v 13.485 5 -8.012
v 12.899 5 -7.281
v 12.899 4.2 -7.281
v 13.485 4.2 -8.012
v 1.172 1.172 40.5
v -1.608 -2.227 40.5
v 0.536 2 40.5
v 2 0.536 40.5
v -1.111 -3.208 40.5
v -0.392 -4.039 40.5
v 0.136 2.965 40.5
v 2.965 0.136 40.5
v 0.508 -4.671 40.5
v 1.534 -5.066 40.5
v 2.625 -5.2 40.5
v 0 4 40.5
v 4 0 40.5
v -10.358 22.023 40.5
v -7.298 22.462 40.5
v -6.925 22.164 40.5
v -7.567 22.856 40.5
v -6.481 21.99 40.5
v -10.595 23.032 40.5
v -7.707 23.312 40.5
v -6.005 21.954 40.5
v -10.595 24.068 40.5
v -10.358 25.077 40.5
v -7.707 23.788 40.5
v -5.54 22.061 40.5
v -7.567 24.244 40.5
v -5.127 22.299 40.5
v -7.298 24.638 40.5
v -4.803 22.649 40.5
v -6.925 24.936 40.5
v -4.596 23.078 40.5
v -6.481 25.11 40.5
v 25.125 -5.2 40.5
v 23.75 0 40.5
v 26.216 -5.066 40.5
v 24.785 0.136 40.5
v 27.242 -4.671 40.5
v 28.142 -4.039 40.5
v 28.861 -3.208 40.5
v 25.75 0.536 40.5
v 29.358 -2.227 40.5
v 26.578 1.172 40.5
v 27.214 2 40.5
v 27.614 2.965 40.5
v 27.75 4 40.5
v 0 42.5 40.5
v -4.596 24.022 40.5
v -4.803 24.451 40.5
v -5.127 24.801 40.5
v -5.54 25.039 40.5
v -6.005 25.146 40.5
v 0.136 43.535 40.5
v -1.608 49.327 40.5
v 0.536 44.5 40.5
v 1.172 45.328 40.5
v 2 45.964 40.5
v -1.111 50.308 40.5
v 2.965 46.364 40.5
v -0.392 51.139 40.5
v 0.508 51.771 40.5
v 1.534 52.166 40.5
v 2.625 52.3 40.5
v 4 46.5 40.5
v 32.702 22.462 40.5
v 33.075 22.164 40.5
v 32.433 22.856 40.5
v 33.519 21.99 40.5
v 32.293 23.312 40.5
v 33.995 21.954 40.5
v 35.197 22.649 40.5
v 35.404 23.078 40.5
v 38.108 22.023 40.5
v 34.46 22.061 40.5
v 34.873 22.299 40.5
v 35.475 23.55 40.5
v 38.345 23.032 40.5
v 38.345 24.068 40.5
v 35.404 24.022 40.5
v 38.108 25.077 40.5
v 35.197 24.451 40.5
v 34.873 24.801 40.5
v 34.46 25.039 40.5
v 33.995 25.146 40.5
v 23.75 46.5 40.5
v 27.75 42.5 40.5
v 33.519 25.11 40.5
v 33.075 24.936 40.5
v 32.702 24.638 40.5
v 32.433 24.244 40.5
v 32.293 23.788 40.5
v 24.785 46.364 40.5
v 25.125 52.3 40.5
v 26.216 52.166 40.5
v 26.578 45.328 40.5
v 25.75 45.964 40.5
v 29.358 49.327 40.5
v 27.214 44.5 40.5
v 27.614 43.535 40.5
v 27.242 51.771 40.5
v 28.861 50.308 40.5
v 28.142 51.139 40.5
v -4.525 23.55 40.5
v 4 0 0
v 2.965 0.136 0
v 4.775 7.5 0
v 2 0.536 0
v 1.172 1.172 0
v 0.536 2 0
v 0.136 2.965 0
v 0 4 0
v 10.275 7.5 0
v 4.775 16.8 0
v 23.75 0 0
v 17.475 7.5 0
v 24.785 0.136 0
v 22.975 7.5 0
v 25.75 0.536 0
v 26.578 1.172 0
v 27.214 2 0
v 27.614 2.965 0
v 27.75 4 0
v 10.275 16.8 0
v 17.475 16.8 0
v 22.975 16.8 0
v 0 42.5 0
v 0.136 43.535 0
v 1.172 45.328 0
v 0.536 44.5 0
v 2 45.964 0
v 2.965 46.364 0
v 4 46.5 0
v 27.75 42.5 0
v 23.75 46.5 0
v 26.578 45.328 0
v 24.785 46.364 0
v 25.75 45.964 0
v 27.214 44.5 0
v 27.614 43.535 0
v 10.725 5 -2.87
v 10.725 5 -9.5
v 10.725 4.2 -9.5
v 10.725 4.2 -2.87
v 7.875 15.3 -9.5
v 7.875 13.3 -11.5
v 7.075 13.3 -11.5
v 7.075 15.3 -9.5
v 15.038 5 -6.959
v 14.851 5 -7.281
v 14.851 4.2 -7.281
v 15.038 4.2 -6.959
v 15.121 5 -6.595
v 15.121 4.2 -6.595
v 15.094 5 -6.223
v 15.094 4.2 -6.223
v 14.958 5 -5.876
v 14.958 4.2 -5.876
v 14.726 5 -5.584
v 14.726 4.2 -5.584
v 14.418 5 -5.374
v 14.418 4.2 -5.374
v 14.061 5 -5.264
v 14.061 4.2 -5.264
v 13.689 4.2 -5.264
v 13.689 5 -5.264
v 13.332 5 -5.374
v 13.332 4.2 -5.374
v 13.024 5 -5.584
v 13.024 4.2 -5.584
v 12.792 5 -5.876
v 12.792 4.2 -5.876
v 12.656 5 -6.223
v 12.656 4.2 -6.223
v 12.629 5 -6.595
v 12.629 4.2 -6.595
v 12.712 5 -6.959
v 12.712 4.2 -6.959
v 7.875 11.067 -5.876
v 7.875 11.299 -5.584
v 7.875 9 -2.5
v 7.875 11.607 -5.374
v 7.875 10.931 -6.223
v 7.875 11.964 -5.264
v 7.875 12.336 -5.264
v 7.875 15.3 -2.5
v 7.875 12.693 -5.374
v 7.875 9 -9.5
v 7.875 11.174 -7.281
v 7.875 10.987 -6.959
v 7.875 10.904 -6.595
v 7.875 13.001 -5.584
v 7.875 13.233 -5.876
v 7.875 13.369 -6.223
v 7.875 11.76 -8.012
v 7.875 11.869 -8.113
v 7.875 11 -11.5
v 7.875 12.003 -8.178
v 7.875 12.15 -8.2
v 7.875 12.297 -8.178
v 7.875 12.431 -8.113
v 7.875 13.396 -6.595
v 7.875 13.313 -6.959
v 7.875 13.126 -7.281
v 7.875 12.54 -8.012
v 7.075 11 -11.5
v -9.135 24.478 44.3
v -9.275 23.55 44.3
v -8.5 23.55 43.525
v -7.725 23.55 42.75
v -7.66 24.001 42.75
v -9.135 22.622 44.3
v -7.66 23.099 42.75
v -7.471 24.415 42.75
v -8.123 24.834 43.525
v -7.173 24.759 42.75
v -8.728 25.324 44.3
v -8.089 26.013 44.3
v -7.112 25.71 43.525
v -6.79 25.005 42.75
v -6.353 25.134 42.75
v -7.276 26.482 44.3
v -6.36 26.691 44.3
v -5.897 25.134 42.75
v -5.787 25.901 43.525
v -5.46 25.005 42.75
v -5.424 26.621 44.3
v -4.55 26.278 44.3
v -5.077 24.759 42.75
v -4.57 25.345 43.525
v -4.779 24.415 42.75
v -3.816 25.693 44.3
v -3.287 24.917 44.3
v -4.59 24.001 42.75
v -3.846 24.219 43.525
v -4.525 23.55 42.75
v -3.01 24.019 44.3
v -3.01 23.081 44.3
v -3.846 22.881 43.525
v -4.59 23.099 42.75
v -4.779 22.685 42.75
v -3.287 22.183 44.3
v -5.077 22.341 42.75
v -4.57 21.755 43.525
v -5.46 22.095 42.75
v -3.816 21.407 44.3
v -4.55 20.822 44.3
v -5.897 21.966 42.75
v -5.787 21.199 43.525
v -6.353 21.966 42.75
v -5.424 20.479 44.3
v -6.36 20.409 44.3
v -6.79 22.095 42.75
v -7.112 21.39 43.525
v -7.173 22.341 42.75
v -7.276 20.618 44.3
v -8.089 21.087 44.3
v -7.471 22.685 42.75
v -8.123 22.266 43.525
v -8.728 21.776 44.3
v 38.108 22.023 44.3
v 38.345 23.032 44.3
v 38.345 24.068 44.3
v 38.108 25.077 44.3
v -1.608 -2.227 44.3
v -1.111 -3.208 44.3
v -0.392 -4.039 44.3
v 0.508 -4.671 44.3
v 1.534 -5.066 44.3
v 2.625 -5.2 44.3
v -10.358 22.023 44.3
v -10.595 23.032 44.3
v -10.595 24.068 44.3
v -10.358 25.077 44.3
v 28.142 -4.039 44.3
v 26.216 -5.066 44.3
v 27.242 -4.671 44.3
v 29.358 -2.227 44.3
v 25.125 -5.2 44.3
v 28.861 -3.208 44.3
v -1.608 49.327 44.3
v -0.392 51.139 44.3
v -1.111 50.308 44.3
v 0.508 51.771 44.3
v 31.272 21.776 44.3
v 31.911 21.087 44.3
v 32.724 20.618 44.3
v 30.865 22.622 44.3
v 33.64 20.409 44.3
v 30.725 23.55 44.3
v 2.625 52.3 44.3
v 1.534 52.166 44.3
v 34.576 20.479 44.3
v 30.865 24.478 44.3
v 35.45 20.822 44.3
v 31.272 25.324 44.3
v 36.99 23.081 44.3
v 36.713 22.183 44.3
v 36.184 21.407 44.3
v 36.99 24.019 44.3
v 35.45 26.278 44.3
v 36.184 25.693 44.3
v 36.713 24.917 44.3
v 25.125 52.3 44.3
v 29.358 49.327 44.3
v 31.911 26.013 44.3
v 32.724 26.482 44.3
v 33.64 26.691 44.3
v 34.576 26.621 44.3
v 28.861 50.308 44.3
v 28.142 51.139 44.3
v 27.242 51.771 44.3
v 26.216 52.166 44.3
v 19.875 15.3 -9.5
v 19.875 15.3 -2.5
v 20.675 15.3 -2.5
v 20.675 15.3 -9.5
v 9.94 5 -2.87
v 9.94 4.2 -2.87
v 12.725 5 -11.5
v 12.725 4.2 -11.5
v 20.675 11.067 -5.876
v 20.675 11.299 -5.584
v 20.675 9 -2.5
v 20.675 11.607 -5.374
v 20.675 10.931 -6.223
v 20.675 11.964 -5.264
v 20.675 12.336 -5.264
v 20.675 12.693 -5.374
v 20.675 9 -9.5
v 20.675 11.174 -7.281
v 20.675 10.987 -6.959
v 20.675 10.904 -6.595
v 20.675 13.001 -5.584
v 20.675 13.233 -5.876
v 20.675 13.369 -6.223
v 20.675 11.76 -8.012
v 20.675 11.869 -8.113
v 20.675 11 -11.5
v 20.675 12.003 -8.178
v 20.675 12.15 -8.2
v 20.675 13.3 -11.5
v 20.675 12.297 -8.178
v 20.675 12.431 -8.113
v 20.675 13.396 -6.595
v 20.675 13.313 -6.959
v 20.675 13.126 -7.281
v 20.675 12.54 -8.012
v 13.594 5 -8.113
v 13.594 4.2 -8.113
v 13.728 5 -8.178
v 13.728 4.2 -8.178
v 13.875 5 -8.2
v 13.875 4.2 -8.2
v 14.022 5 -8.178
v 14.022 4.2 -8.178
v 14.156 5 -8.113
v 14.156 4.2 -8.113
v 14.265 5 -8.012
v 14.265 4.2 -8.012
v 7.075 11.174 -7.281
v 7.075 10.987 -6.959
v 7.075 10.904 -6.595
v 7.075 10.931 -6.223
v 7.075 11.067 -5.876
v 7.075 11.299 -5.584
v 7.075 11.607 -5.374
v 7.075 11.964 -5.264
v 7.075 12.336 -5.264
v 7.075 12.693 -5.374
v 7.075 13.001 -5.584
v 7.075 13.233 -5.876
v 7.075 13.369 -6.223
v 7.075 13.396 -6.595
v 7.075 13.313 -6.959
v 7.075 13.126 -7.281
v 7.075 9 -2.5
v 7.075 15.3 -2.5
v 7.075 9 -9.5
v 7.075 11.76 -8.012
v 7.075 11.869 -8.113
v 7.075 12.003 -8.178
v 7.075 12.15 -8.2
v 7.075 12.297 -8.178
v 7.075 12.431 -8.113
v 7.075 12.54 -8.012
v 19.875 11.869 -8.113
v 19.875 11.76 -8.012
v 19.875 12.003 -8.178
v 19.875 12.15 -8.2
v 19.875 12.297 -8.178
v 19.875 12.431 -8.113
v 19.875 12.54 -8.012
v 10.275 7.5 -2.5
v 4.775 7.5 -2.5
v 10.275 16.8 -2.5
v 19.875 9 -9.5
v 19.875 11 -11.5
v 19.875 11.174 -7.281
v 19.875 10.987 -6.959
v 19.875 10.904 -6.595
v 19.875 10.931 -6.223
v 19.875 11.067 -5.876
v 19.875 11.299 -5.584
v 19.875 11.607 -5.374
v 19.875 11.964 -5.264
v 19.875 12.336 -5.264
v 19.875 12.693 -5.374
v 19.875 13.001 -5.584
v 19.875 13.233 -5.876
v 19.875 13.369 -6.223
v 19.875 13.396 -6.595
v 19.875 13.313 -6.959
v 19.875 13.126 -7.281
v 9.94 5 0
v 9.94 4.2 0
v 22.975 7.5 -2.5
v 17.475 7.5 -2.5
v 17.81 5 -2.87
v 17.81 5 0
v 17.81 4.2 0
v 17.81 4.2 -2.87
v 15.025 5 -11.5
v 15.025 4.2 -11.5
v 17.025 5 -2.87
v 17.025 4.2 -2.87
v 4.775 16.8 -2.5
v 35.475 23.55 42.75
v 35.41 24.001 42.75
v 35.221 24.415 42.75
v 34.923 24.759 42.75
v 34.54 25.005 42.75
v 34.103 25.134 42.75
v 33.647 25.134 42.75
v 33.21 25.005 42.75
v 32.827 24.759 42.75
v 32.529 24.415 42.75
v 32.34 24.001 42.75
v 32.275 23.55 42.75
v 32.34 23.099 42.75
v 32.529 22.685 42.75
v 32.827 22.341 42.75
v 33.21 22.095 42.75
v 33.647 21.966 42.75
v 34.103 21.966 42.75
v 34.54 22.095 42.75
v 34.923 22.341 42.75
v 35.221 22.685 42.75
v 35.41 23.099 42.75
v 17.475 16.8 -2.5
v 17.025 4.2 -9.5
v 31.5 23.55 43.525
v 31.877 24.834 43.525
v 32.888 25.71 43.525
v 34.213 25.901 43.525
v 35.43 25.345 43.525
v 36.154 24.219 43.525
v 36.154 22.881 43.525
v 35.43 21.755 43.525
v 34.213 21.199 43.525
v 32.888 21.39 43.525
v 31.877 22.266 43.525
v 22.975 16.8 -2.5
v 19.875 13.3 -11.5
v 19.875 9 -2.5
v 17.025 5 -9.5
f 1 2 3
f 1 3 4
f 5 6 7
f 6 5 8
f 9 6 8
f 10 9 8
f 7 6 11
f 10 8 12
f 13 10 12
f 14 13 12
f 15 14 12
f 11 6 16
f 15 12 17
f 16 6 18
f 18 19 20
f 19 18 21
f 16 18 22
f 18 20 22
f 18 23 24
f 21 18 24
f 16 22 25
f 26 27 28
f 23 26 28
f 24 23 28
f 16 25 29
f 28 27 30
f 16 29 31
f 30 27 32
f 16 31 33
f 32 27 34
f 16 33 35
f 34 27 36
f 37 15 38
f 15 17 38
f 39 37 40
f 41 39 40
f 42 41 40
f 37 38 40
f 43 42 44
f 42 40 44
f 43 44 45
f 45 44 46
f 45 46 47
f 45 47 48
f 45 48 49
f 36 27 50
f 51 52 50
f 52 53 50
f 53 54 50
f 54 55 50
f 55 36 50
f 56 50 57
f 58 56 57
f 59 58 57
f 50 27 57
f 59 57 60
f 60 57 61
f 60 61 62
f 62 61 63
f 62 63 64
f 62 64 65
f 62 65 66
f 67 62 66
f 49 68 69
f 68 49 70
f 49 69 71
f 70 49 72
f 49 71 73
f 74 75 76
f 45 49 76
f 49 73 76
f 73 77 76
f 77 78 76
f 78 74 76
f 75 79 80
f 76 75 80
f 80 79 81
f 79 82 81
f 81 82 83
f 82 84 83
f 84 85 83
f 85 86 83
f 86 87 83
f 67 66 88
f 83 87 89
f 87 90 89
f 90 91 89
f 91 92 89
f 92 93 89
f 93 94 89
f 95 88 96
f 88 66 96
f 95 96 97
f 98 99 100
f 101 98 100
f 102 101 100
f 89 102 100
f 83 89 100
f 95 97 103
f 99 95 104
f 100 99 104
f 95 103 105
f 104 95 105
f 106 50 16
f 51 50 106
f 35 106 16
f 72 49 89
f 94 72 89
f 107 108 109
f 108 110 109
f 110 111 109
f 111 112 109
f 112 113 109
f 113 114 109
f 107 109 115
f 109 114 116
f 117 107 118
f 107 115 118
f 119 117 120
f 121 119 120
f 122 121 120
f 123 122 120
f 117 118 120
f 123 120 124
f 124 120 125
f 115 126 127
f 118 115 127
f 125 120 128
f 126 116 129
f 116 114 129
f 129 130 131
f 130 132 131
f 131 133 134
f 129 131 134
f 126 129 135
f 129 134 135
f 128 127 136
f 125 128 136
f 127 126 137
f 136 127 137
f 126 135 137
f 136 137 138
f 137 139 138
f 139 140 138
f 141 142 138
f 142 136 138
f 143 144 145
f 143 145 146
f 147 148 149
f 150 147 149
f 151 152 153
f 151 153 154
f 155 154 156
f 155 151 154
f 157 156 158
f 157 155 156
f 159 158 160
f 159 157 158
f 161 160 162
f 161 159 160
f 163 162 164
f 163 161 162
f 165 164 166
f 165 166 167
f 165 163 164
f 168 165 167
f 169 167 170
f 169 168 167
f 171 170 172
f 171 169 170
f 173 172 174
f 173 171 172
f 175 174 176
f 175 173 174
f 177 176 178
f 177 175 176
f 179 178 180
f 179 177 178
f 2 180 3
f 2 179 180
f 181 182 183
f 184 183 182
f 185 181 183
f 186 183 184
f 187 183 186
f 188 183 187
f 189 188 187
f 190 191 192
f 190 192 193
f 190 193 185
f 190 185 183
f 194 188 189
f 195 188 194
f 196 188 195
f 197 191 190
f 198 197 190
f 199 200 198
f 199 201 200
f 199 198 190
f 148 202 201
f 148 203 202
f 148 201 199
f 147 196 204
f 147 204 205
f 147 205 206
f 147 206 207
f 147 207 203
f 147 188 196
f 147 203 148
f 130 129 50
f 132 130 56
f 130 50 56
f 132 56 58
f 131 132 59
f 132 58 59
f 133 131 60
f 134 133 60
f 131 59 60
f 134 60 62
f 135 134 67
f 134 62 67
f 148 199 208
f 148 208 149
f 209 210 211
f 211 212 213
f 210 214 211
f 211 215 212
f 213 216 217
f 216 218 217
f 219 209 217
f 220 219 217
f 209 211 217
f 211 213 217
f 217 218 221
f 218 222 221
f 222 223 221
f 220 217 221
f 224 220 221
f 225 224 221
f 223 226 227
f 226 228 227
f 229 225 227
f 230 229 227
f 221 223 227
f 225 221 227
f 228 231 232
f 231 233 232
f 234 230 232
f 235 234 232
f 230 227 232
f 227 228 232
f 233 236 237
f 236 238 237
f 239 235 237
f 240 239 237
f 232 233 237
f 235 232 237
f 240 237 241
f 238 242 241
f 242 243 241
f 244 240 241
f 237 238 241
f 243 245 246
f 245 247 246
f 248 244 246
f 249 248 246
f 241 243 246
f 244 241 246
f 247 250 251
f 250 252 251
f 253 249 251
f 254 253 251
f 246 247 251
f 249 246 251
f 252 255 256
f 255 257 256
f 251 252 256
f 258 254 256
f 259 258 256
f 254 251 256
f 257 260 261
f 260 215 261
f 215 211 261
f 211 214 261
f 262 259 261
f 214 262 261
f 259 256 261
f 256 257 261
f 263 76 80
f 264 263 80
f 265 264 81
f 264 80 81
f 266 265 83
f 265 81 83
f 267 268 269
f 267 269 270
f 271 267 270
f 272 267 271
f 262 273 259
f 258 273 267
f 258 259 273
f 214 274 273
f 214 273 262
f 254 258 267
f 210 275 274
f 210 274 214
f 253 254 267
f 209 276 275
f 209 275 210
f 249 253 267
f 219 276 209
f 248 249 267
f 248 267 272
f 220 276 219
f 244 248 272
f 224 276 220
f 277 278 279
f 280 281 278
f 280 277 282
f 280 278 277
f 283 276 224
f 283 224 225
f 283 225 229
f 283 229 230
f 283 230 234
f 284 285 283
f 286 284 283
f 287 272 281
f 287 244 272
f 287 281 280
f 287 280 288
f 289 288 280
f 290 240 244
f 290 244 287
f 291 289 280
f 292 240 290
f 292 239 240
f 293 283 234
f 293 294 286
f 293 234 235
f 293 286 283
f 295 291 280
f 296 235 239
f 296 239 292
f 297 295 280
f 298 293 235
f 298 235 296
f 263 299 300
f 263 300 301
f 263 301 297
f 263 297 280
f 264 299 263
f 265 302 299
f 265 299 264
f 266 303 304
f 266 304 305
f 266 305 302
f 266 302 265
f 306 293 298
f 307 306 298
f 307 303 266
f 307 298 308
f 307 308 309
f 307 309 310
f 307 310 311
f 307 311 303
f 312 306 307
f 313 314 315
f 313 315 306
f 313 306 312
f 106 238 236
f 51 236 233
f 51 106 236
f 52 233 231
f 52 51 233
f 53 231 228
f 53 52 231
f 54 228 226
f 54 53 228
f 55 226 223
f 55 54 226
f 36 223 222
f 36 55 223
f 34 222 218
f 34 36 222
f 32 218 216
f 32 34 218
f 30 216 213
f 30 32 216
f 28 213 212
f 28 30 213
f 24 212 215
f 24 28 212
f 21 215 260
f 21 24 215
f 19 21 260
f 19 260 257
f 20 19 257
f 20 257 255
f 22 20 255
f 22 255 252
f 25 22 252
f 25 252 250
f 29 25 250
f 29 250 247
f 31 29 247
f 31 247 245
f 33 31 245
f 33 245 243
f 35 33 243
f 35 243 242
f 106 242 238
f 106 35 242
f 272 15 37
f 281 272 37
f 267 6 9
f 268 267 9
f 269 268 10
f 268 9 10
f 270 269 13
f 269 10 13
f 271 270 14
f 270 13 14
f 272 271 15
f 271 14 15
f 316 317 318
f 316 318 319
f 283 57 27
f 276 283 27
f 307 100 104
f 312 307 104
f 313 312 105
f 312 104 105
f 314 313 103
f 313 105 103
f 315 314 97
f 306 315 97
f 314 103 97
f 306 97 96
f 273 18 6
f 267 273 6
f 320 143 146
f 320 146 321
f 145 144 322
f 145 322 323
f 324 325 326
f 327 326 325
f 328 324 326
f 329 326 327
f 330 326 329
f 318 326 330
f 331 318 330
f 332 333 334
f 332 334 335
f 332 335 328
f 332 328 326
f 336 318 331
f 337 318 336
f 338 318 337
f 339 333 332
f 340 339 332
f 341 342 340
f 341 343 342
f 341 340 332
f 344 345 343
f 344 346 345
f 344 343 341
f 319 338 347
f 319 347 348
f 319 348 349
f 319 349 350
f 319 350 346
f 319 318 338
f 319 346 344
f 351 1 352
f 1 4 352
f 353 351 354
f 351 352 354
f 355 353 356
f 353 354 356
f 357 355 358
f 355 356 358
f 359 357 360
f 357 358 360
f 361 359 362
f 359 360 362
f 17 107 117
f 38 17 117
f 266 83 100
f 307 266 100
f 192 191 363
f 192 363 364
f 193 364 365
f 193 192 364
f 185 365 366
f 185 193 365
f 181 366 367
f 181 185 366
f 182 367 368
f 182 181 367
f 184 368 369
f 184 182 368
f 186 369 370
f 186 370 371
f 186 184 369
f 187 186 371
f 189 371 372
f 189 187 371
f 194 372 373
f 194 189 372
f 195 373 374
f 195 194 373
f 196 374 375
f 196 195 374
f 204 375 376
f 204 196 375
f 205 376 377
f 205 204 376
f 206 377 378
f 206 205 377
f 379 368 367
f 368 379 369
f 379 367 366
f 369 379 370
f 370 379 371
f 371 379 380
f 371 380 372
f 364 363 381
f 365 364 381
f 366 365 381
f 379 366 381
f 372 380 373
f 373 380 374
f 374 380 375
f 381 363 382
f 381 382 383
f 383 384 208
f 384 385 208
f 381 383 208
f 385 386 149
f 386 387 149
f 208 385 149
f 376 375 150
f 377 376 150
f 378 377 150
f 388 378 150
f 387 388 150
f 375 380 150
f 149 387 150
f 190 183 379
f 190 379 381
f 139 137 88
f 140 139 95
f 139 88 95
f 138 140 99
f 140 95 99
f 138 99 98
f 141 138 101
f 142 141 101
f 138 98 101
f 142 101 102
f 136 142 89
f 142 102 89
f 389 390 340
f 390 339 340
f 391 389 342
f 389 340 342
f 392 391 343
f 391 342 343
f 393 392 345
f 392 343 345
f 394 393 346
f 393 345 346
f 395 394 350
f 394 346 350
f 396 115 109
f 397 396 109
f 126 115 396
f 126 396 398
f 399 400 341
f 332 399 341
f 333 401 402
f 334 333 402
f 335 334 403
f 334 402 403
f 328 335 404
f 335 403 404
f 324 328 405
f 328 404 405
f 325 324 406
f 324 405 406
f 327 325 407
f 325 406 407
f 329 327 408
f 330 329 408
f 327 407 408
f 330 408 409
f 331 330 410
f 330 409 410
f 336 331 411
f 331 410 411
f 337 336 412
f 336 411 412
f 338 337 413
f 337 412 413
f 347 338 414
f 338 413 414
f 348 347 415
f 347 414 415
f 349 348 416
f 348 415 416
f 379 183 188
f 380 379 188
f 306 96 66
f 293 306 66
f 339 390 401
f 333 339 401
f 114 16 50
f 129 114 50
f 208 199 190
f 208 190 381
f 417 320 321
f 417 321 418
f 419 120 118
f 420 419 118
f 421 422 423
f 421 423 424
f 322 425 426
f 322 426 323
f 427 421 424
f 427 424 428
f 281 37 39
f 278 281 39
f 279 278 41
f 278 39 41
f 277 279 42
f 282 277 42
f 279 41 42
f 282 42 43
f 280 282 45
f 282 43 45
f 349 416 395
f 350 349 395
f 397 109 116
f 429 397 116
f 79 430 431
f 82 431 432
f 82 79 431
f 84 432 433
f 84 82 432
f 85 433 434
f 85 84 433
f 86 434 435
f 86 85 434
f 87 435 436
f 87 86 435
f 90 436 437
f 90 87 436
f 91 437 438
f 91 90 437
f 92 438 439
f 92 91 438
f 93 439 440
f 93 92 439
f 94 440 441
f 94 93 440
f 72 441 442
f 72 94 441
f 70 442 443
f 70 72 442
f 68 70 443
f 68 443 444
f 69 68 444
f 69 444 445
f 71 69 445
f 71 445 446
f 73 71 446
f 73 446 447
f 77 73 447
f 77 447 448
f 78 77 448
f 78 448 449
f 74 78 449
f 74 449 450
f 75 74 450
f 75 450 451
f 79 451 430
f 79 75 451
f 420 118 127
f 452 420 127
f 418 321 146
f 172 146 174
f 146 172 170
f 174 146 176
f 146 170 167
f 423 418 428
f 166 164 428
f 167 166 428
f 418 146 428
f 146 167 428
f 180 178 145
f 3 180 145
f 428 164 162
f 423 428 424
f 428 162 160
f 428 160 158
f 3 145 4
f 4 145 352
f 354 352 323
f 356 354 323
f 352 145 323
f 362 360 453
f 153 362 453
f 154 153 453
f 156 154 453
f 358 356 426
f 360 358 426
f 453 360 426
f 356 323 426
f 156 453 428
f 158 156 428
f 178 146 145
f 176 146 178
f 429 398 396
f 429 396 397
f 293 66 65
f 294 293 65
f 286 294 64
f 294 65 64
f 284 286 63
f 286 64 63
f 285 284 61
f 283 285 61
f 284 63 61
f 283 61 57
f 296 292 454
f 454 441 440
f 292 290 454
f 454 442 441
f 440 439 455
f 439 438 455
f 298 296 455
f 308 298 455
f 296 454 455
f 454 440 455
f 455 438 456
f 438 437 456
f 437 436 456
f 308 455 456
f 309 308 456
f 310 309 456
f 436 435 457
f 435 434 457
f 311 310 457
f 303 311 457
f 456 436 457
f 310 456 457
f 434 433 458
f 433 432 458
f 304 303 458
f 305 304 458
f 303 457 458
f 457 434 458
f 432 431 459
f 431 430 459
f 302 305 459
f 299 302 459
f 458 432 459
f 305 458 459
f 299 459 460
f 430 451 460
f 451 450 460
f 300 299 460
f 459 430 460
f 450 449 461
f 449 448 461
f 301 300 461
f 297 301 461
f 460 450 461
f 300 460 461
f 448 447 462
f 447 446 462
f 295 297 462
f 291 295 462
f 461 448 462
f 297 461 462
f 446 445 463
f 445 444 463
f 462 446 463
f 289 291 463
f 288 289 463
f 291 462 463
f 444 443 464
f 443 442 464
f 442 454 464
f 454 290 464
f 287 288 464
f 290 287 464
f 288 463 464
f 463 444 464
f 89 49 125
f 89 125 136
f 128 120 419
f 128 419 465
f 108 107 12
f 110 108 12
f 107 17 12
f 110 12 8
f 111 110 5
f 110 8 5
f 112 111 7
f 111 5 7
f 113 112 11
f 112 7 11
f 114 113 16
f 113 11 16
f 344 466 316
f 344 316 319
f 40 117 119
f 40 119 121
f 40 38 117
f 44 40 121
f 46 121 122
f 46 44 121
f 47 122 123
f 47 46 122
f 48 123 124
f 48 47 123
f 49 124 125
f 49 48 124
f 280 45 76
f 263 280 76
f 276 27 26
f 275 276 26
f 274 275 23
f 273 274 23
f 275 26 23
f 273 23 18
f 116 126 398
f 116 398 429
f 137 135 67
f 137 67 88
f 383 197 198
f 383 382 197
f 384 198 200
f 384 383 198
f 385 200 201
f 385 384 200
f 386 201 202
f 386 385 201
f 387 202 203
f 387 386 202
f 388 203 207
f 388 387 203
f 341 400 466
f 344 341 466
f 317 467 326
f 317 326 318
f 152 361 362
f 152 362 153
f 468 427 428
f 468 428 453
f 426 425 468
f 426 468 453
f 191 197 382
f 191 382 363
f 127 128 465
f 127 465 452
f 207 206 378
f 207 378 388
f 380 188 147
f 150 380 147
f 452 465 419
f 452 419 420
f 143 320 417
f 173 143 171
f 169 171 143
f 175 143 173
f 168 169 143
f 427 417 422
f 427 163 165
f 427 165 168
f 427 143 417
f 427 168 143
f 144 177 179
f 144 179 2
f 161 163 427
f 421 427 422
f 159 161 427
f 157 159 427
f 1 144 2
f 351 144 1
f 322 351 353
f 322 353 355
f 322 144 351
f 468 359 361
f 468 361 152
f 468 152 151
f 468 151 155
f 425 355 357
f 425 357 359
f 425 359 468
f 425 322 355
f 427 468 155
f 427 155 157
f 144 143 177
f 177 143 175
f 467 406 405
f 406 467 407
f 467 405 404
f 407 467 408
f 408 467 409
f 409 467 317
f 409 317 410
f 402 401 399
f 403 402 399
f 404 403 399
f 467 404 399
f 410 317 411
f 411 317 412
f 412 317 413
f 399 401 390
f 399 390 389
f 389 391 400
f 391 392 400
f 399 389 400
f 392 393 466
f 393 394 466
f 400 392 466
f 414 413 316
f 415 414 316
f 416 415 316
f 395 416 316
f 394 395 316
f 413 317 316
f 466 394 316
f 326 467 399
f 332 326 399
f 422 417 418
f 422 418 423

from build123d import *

# Parameters (mm, degrees)
SKETCH1_W                                       = 27.75
SKETCH1_H                                       = 46.5
BOSS_EXTRUDE1_DEPTH                             = 40.5
SKETCH2_R                                       = 1.6
BOSS_EXTRUDE2_DEPTH                             = 3.8
CSK_FOR_M3_FLAT_HEAD_MACHINE_SCREW1_D           = 3.2
CSK_FOR_M3_FLAT_HEAD_MACHINE_SCREW1_CSINK_D     = 6.3
CSK_FOR_M3_FLAT_HEAD_MACHINE_SCREW1_CSINK_ANGLE = 90
SKETCH5_W                                       = 5.5
SKETCH5_H                                       = 9.3
BOSS_EXTRUDE3_DEPTH                             = 2.5
BOSS_EXTRUDE4_DEPTH                             = 0.8
CHAMFER1_SIZE                                   = 2
FILLET1_R                                       = 0.5
SKETCH7_W                                       = 9
SKETCH7_H                                       = 6.3
BOSS_EXTRUDE5_DEPTH                             = 0.8
CHAMFER2_SIZE                                   = 2
FILLET3_R                                       = 0.5
FILLET2_R                                       = 4


with BuildPart() as part:
    # Sketch1 → Boss-Extrude1 (new body)
    with BuildSketch(Plane.XY):
        with Locations((13.875, 23.25)):
            Rectangle(SKETCH1_W, SKETCH1_H)
    extrude(amount=BOSS_EXTRUDE1_DEPTH)

    # Sketch2 → Boss-Extrude2 (add)
    with BuildSketch(Plane.XY.offset(40.5)):
        with BuildLine():
            Line((2.625, -5.2), (25.125, -5.2))
            ThreePointArc((25.125, -5.2), (27.711215896, -4.382592475), (29.357879644, -2.227327706))
            Line((29.357879644, -2.227327706), (38.107879644, 22.022672294))
            ThreePointArc((38.107879644, 22.022672294), (38.375, 23.55), (38.107879644, 25.077327706))
            Line((38.107879644, 25.077327706), (29.357879644, 49.327327706))
            ThreePointArc((29.357879644, 49.327327706), (27.711215896, 51.482592475), (25.125, 52.3))
            Line((25.125, 52.3), (2.625, 52.3))
            ThreePointArc((2.625, 52.3), (0.038784104, 51.482592475), (-1.607879644, 49.327327706))
            Line((-1.607879644, 49.327327706), (-10.357879644, 25.077327706))
            ThreePointArc((-10.357879644, 25.077327706), (-10.625, 23.55), (-10.357879644, 22.022672294))
            Line((-10.357879644, 22.022672294), (-1.607879644, -2.227327706))
            ThreePointArc((-1.607879644, -2.227327706), (0.038784104, -4.382592475), (2.625, -5.2))
        make_face()
        with Locations((-6.125, 23.55)):
            Circle(SKETCH2_R, mode=Mode.SUBTRACT)
        with Locations((33.875, 23.55)):
            Circle(SKETCH2_R, mode=Mode.SUBTRACT)
    extrude(amount=BOSS_EXTRUDE2_DEPTH)

    # CSK for M3 Flat Head Machine Screw1 (through all)
    with Locations(Plane.XY.offset(44.3)):
        with Locations((-6.125, 23.55), (33.875, 23.55)):
            CounterSinkHole(CSK_FOR_M3_FLAT_HEAD_MACHINE_SCREW1_D / 2, CSK_FOR_M3_FLAT_HEAD_MACHINE_SCREW1_CSINK_D / 2, counter_sink_angle=CSK_FOR_M3_FLAT_HEAD_MACHINE_SCREW1_CSINK_ANGLE)

    # Sketch5 → Boss-Extrude3 (add)
    with BuildSketch(Plane(origin=(0, 0, 0), x_dir=(-1, 0, 0), z_dir=(0, 0, -1))):
        with Locations((-20.225, 12.15)):
            Rectangle(SKETCH5_W, SKETCH5_H)
        with Locations((-7.525, 12.15)):
            Rectangle(SKETCH5_W, SKETCH5_H)
    extrude(amount=BOSS_EXTRUDE3_DEPTH)

    # Fillet2
    fillet2_edges = [part.edges().sort_by_distance(p)[0] for p in [
        (0, 46.5, 20.25),
        (27.75, 46.5, 20.25),
        (27.75, 0, 20.25),
        (0, 0, 20.25),
    ]]
    fillet(fillet2_edges, radius=FILLET2_R)


with BuildPart() as body_2:
    # Sketch6 → Boss-Extrude4 (new body)
    with BuildSketch(Plane(origin=(0, 5, 0), x_dir=(-1, 0, 0), z_dir=(0, -1, 0))):
        Polygon((-17.81, 0), (-17.81, 2.87), (-17.025, 2.87), (-17.025, 11.5), (-10.725, 11.5), (-10.725, 2.87), (-9.94, 2.87), (-9.94, 0), align=None)
        with BuildLine():
            Line((-13.875, 8.5), (-14.850780937, 7.28125))
            ThreePointArc((-14.850780937, 7.28125), (-13.875, 5.25), (-12.899219063, 7.28125))
            Line((-12.899219063, 7.28125), (-13.875, 8.5))
        make_face(mode=Mode.SUBTRACT)
    extrude(amount=BOSS_EXTRUDE4_DEPTH)

    # Chamfer1
    chamfer1_edges = [body_2.edges().sort_by_distance(p)[0] for p in [
        (17.025, 4.6, -11.5),
        (10.725, 4.6, -11.5),
    ]]
    chamfer(chamfer1_edges, length=CHAMFER1_SIZE)

    # Fillet1
    fillet1_edges = [body_2.edges().sort_by_distance(p)[0] for p in [
        (13.875, 4.6, -8.5),
    ]]
    fillet(fillet1_edges, radius=FILLET1_R)


with BuildPart() as body_3:
    # Sketch7 → Boss-Extrude5 (new body)
    with BuildSketch(Plane(origin=(19.875, 0, 0), x_dir=(0, 0, -1), z_dir=(1, 0, 0))):
        with Locations((7, 12.15)):
            Rectangle(SKETCH7_W, SKETCH7_H)
        with BuildLine():
            Line((7.28125, 13.125780937), (8.5, 12.15))
            Line((8.5, 12.15), (7.28125, 11.174219063))
            ThreePointArc((7.28125, 11.174219063), (5.25, 12.15), (7.28125, 13.125780937))
        make_face(mode=Mode.SUBTRACT)
    extrude(amount=BOSS_EXTRUDE5_DEPTH)

    # Chamfer2
    chamfer2_edges = [body_3.edges().sort_by_distance(p)[0] for p in [
        (20.275, 15.3, -11.5),
        (20.275, 9, -11.5),
    ]]
    chamfer(chamfer2_edges, length=CHAMFER2_SIZE)

    # Fillet3
    fillet3_edges = [body_3.edges().sort_by_distance(p)[0] for p in [
        (20.275, 12.15, -8.5),
    ]]
    fillet(fillet3_edges, radius=FILLET3_R)


with BuildPart() as body_4:
    # Mirror2: mirrored copy
    add(body_3.part.mirror(Plane(origin=(13.875, 0, 0), x_dir=(0, 0, 1), z_dir=(1, 0, 0))))


solid = Compound([part.part, body_2.part, body_3.part, body_4.part])
